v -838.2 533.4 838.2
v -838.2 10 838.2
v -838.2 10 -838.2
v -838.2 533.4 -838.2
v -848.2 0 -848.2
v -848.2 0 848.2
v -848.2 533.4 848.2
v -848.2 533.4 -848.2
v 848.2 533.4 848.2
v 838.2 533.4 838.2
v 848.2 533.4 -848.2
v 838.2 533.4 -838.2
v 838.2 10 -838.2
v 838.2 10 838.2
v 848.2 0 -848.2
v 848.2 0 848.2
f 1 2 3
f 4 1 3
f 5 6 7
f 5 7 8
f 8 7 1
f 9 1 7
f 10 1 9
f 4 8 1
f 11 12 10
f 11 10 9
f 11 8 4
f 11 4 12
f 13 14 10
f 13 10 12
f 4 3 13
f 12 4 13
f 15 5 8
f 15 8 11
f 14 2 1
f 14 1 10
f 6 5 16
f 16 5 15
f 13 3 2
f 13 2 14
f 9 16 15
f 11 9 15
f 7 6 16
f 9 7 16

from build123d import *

# Parameters (mm, degrees)
SKETCH1_W           = 1676.4
SKETCH1_H           = 1676.4
BOSS_EXTRUDE1_DEPTH = 10
SKETCH1_2_W         = 1696.4
SKETCH1_2_H         = 1696.4
SKETCH1_2_W_2       = 1676.4
SKETCH1_2_H_2       = 1676.4
EXTRUDE_THIN1_DEPTH = 533.4


with BuildPart() as part:
    # Sketch1 → Boss-Extrude1 (new body)
    with BuildSketch(Plane(origin=(0, 0, 0), x_dir=(1, 0, 0), z_dir=(0, 1, 0))):
        Rectangle(SKETCH1_W, SKETCH1_H)
    extrude(amount=BOSS_EXTRUDE1_DEPTH)

    # Sketch1<2> → Extrude-Thin1 (add)
    with BuildSketch(Plane(origin=(0, 0, 0), x_dir=(1, 0, 0), z_dir=(0, 1, 0))):
        Rectangle(SKETCH1_2_W, SKETCH1_2_H)
        Rectangle(SKETCH1_2_W_2, SKETCH1_2_H_2, mode=Mode.SUBTRACT)
    extrude(amount=EXTRUDE_THIN1_DEPTH)


solid = part.part
